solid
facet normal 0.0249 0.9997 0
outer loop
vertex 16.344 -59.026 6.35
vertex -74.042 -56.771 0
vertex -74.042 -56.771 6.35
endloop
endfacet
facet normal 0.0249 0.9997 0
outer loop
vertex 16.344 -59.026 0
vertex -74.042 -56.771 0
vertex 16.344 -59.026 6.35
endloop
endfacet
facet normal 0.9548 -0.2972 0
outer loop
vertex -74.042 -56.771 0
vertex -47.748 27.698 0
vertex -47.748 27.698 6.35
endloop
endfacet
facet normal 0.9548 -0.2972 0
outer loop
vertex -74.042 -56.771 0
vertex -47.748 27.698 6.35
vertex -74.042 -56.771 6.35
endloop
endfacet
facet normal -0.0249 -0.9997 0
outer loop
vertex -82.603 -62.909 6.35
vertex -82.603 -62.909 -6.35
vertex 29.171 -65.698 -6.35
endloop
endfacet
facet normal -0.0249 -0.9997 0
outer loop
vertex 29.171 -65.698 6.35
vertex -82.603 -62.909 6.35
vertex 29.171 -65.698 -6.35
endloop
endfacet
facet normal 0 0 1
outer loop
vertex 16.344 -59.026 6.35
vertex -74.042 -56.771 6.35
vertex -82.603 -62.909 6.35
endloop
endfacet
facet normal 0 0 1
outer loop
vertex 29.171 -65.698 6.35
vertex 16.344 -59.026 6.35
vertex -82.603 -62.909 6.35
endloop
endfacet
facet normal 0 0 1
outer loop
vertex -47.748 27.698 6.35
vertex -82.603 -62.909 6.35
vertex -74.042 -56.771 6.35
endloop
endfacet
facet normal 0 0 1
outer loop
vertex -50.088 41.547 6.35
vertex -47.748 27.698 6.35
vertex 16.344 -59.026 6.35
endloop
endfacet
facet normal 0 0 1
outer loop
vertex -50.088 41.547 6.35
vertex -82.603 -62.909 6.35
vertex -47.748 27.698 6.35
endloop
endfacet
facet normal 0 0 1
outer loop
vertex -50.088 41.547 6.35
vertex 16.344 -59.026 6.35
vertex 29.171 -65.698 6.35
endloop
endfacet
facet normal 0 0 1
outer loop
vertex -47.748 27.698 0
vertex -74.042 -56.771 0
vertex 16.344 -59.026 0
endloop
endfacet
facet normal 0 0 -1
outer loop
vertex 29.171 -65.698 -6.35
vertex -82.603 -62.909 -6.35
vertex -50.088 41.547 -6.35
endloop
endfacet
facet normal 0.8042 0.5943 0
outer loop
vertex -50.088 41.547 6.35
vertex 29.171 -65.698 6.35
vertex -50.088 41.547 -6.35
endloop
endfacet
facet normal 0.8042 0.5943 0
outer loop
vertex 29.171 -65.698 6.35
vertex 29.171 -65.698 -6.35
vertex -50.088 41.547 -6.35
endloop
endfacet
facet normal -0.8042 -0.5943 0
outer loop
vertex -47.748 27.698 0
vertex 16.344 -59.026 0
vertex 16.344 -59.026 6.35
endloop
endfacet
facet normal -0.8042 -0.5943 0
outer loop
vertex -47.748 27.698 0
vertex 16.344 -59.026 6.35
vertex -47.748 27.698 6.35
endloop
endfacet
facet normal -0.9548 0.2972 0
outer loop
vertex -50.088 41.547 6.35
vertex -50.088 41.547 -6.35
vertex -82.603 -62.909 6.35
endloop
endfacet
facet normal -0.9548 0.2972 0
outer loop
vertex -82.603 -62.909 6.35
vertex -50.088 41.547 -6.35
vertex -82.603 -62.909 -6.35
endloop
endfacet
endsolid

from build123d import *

# Parameters (mm, degrees)
F1_DEPTH = 6.35
F3_T     = 6.35


# Not quite as in the source:
# - a feature names something its author has since deleted; it is built from what else it names


with BuildPart() as f1:
    # F0 (on Top) → F1 (new body)
    with BuildSketch(Plane.XY):
        Polygon((-47.7481111884, 27.6977252215), (-74.0418732166, -56.7705929279), (16.344493255, -59.0262524784), align=None)
    extrude(amount=F1_DEPTH)

    # F3
    f3_openings = [f1.faces().sort_by_distance(p)[0] for p in [
        (-35.148497, -29.366373, 6.35),
    ]]
    offset(amount=F3_T, openings=f3_openings, kind=Kind.INTERSECTION)


solid = f1.part
